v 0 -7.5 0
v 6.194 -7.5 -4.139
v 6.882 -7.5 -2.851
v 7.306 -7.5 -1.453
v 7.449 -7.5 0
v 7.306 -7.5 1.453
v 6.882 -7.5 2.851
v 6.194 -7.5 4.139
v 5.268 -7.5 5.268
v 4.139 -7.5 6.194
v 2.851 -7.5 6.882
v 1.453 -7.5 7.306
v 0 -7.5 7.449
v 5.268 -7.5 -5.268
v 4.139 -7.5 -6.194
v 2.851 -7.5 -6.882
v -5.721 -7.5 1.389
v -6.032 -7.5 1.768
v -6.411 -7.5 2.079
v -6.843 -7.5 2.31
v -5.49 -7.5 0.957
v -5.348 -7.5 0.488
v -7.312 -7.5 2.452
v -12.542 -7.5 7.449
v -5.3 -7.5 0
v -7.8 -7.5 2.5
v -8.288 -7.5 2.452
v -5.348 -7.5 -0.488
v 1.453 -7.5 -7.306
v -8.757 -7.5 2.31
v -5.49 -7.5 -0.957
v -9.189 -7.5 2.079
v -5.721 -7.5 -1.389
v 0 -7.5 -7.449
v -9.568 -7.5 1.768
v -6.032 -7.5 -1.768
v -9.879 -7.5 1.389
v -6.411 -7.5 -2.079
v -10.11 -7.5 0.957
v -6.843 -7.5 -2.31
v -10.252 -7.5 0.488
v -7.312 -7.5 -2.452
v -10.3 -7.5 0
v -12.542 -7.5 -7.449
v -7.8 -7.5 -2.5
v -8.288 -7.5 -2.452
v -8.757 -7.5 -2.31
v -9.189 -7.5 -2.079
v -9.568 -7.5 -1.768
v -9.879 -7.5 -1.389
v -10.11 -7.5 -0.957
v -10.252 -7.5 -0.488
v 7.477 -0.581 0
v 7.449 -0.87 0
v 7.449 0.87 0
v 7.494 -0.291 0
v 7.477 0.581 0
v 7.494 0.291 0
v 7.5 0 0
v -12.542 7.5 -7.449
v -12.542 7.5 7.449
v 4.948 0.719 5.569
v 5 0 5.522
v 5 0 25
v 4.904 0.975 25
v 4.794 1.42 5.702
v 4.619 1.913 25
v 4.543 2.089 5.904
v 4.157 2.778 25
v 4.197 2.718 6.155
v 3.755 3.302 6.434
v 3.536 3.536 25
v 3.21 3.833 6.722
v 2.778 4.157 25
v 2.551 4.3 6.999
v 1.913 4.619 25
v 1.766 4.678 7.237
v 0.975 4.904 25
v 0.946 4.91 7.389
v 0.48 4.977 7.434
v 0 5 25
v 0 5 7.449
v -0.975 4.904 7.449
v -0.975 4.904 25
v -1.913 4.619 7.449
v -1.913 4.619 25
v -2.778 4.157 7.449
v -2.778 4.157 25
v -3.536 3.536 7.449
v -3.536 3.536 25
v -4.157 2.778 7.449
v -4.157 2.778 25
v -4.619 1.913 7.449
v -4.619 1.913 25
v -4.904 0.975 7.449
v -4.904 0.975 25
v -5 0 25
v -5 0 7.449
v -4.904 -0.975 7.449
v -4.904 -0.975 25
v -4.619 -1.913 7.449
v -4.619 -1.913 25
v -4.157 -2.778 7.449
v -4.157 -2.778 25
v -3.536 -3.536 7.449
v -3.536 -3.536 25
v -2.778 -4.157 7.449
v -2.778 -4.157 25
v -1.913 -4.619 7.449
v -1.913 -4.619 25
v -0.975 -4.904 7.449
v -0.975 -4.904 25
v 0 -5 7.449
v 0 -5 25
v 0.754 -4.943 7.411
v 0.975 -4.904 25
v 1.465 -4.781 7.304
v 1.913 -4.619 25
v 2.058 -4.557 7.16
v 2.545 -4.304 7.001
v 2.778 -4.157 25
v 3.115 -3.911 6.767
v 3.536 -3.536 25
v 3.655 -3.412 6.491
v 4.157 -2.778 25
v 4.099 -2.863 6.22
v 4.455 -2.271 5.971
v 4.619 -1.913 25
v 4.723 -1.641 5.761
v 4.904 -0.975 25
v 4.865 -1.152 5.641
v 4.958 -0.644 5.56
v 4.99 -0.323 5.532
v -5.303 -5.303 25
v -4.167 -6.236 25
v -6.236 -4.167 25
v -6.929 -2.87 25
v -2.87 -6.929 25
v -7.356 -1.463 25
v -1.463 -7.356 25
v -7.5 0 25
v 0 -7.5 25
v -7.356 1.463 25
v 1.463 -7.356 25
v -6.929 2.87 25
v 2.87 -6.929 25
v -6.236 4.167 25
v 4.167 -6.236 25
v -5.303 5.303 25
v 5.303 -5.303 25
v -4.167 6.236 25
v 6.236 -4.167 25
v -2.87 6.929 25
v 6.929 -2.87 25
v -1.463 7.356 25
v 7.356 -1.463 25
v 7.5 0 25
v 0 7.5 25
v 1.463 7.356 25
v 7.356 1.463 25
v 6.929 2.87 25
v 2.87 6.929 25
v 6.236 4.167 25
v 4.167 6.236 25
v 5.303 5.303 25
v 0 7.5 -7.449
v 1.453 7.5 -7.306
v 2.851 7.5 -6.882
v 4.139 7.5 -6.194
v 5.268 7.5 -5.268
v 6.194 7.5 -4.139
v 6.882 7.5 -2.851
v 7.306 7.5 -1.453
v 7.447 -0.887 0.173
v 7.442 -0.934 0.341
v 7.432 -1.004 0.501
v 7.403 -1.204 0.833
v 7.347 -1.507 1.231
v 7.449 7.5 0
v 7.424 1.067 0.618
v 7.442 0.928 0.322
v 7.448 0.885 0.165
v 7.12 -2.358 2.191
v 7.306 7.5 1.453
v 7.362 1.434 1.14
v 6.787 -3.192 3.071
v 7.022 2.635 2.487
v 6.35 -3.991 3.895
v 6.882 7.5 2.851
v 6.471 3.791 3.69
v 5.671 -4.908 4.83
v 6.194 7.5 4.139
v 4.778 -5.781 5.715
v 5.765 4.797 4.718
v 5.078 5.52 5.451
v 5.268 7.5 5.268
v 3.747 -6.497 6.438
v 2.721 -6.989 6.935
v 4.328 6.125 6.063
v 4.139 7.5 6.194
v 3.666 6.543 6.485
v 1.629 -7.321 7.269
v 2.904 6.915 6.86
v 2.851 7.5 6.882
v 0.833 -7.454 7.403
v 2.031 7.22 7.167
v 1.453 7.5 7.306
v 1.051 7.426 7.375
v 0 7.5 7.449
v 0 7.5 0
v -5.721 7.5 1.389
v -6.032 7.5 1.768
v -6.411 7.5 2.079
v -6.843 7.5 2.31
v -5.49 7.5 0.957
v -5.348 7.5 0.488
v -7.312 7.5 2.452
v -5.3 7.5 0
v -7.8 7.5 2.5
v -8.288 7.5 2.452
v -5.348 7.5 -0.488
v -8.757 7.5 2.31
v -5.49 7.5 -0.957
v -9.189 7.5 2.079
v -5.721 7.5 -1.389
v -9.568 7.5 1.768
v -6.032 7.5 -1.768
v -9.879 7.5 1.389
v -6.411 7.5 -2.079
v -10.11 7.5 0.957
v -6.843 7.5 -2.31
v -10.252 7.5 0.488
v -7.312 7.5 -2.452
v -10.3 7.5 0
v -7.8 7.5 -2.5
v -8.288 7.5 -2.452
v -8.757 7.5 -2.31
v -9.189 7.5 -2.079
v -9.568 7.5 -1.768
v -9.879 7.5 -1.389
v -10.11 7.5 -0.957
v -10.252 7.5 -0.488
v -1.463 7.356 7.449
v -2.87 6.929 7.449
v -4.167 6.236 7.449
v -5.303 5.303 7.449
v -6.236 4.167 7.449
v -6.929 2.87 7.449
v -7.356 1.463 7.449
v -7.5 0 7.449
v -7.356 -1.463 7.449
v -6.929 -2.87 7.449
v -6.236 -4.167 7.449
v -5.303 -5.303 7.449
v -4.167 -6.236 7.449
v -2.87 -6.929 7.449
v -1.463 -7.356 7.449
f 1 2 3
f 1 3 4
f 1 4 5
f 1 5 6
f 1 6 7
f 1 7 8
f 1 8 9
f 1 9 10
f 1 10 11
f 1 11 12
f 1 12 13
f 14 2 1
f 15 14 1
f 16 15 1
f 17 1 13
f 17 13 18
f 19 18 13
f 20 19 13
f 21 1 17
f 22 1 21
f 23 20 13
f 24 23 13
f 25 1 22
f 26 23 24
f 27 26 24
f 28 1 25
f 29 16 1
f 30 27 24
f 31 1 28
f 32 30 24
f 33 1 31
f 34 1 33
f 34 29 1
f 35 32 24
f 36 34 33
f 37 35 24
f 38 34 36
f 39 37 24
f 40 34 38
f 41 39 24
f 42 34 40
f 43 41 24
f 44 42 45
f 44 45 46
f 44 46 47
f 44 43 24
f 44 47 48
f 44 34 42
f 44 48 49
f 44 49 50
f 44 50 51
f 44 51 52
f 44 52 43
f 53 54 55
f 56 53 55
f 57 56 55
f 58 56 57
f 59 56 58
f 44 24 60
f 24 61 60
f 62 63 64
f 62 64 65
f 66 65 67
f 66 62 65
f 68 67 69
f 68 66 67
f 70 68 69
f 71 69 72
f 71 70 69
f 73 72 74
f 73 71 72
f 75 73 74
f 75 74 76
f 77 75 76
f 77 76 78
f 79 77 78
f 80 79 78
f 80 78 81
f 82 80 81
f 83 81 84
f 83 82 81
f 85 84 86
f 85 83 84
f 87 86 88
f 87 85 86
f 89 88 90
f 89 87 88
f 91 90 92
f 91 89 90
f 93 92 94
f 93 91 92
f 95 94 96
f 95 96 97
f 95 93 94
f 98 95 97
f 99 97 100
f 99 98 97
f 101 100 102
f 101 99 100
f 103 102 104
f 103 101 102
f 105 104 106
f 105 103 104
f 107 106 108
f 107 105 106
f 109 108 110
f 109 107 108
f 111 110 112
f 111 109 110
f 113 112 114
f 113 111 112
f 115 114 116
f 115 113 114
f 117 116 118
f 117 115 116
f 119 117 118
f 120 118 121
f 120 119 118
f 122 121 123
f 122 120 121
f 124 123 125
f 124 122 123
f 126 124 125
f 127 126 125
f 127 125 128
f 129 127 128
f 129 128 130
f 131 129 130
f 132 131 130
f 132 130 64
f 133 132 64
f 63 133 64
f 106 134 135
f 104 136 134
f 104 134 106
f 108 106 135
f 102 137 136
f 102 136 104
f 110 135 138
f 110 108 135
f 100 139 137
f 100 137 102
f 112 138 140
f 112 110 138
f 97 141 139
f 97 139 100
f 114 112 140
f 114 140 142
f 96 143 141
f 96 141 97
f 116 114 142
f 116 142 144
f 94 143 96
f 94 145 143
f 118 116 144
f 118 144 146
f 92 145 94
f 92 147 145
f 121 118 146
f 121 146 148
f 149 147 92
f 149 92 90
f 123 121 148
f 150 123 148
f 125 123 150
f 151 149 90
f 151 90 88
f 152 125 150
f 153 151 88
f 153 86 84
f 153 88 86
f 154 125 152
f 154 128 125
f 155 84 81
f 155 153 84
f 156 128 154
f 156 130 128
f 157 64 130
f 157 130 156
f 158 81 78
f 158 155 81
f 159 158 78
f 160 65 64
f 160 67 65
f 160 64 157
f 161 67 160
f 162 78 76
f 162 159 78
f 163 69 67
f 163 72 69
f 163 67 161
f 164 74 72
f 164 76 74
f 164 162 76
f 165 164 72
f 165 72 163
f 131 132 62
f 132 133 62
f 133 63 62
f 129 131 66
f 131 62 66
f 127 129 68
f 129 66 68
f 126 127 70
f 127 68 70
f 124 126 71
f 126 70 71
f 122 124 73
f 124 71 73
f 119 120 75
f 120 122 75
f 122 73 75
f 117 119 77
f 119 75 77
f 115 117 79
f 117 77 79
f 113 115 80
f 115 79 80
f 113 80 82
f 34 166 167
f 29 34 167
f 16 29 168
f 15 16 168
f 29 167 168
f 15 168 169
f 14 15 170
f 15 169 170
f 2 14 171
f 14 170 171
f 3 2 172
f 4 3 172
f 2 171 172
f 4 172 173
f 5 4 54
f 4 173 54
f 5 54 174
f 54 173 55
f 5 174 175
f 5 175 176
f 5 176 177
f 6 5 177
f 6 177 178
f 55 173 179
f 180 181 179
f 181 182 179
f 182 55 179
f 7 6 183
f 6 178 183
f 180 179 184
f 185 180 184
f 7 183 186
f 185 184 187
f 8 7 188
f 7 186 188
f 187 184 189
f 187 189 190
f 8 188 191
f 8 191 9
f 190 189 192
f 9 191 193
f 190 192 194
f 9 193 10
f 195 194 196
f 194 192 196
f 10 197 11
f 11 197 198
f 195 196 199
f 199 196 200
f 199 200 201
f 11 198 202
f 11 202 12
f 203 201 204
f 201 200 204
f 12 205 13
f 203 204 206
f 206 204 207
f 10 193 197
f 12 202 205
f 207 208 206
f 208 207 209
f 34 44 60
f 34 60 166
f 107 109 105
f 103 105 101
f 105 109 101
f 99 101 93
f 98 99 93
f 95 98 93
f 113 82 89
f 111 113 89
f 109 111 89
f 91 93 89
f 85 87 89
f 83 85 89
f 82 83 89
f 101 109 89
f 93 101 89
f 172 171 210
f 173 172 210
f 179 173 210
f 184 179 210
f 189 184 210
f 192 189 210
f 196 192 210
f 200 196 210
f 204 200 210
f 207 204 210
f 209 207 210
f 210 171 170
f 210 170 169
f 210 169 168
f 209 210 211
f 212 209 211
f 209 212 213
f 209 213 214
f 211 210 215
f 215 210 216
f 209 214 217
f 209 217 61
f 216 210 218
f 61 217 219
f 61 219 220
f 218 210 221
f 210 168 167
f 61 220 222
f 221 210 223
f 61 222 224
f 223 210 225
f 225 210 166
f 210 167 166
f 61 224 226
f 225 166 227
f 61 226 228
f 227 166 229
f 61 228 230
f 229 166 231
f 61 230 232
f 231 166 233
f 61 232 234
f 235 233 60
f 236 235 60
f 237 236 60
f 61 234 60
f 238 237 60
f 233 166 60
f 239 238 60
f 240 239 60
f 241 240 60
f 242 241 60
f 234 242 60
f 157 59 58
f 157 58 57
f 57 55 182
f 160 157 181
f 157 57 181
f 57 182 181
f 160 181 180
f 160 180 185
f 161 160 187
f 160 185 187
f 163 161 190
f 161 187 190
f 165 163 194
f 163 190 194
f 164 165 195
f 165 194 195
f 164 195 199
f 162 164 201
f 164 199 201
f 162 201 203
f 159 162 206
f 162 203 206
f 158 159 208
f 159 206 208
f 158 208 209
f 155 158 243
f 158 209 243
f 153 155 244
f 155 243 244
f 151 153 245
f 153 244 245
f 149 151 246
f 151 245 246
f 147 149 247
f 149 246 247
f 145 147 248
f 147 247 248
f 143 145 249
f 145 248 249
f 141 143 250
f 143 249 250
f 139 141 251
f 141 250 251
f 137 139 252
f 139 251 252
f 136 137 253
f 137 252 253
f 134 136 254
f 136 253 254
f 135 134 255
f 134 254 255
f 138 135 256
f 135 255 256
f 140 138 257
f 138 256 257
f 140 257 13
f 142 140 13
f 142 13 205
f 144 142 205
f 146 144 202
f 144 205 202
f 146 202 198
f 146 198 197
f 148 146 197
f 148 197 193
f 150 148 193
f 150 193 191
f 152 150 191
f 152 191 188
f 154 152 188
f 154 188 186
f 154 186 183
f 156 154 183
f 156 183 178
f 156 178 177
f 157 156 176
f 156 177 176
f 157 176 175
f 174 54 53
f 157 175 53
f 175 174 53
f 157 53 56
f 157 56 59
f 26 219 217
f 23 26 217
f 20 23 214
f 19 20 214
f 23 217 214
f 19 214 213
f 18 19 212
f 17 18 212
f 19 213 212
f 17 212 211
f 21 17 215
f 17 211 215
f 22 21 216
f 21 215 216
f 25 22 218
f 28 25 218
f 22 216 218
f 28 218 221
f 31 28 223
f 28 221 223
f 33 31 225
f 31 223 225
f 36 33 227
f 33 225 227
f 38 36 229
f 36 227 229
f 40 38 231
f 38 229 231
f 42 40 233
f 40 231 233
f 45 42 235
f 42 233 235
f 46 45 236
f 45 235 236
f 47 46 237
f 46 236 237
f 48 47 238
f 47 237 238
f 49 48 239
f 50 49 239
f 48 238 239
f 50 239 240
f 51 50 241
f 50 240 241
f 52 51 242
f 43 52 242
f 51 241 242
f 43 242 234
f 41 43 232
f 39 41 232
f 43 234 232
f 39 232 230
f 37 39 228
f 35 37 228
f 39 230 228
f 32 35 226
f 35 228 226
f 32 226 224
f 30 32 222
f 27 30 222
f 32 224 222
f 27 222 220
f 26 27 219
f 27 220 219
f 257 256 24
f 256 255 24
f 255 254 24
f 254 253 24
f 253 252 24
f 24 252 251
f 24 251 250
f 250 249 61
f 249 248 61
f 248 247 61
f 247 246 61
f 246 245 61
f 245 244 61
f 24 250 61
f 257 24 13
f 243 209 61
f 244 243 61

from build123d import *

# Parameters (mm, degrees)
SKETCH1_R           = 7.5
SKETCH1_R_2         = 5
BOSS_EXTRUDE1_DEPTH = 25
BOSS_EXTRUDE3_DEPTH = 7.5
SKETCH5_R           = 2.5
CUT_EXTRUDE3_DEPTH  = 15


with BuildPart() as part:
    # Sketch1 → Boss-Extrude1 (new body)
    with BuildSketch(Plane.XY):
        Circle(SKETCH1_R)
        Circle(SKETCH1_R_2, mode=Mode.SUBTRACT)
    extrude(amount=BOSS_EXTRUDE1_DEPTH)

    # Sketch4 → Boss-Extrude3 (add, symmetric)
    with BuildSketch(Plane(origin=(0, 0, 0), x_dir=(1, 0, 0), z_dir=(0, 1, 0))):
        with BuildLine():
            Line((0, -7.449392631), (-9.305010791, -7.449392631))
            Line((-9.305010791, -7.449392631), (-12.541569439, -7.449392631))
            Line((-12.541569439, -7.449392631), (-12.541569439, 7.449392631))
            Line((-12.541569439, 7.449392631), (-9.305010791, 7.449392631))
            Line((-9.305010791, 7.449392631), (0, 7.449392631))
            ThreePointArc((0, 7.449392631), (7.449392631, 0), (0, -7.449392631))
        make_face()
    extrude(amount=BOSS_EXTRUDE3_DEPTH, both=True)

    # Sketch5 → Cut-Extrude3 (cut)
    with BuildSketch(Plane(origin=(0, 7.5, 0), x_dir=(1, 0, 0), z_dir=(0, 1, 0))):
        with Locations(Location((-7.8, 0, 0), (0, 0, 270))):
            Circle(SKETCH5_R)
    extrude(amount=-CUT_EXTRUDE3_DEPTH, mode=Mode.SUBTRACT)


solid = part.part
